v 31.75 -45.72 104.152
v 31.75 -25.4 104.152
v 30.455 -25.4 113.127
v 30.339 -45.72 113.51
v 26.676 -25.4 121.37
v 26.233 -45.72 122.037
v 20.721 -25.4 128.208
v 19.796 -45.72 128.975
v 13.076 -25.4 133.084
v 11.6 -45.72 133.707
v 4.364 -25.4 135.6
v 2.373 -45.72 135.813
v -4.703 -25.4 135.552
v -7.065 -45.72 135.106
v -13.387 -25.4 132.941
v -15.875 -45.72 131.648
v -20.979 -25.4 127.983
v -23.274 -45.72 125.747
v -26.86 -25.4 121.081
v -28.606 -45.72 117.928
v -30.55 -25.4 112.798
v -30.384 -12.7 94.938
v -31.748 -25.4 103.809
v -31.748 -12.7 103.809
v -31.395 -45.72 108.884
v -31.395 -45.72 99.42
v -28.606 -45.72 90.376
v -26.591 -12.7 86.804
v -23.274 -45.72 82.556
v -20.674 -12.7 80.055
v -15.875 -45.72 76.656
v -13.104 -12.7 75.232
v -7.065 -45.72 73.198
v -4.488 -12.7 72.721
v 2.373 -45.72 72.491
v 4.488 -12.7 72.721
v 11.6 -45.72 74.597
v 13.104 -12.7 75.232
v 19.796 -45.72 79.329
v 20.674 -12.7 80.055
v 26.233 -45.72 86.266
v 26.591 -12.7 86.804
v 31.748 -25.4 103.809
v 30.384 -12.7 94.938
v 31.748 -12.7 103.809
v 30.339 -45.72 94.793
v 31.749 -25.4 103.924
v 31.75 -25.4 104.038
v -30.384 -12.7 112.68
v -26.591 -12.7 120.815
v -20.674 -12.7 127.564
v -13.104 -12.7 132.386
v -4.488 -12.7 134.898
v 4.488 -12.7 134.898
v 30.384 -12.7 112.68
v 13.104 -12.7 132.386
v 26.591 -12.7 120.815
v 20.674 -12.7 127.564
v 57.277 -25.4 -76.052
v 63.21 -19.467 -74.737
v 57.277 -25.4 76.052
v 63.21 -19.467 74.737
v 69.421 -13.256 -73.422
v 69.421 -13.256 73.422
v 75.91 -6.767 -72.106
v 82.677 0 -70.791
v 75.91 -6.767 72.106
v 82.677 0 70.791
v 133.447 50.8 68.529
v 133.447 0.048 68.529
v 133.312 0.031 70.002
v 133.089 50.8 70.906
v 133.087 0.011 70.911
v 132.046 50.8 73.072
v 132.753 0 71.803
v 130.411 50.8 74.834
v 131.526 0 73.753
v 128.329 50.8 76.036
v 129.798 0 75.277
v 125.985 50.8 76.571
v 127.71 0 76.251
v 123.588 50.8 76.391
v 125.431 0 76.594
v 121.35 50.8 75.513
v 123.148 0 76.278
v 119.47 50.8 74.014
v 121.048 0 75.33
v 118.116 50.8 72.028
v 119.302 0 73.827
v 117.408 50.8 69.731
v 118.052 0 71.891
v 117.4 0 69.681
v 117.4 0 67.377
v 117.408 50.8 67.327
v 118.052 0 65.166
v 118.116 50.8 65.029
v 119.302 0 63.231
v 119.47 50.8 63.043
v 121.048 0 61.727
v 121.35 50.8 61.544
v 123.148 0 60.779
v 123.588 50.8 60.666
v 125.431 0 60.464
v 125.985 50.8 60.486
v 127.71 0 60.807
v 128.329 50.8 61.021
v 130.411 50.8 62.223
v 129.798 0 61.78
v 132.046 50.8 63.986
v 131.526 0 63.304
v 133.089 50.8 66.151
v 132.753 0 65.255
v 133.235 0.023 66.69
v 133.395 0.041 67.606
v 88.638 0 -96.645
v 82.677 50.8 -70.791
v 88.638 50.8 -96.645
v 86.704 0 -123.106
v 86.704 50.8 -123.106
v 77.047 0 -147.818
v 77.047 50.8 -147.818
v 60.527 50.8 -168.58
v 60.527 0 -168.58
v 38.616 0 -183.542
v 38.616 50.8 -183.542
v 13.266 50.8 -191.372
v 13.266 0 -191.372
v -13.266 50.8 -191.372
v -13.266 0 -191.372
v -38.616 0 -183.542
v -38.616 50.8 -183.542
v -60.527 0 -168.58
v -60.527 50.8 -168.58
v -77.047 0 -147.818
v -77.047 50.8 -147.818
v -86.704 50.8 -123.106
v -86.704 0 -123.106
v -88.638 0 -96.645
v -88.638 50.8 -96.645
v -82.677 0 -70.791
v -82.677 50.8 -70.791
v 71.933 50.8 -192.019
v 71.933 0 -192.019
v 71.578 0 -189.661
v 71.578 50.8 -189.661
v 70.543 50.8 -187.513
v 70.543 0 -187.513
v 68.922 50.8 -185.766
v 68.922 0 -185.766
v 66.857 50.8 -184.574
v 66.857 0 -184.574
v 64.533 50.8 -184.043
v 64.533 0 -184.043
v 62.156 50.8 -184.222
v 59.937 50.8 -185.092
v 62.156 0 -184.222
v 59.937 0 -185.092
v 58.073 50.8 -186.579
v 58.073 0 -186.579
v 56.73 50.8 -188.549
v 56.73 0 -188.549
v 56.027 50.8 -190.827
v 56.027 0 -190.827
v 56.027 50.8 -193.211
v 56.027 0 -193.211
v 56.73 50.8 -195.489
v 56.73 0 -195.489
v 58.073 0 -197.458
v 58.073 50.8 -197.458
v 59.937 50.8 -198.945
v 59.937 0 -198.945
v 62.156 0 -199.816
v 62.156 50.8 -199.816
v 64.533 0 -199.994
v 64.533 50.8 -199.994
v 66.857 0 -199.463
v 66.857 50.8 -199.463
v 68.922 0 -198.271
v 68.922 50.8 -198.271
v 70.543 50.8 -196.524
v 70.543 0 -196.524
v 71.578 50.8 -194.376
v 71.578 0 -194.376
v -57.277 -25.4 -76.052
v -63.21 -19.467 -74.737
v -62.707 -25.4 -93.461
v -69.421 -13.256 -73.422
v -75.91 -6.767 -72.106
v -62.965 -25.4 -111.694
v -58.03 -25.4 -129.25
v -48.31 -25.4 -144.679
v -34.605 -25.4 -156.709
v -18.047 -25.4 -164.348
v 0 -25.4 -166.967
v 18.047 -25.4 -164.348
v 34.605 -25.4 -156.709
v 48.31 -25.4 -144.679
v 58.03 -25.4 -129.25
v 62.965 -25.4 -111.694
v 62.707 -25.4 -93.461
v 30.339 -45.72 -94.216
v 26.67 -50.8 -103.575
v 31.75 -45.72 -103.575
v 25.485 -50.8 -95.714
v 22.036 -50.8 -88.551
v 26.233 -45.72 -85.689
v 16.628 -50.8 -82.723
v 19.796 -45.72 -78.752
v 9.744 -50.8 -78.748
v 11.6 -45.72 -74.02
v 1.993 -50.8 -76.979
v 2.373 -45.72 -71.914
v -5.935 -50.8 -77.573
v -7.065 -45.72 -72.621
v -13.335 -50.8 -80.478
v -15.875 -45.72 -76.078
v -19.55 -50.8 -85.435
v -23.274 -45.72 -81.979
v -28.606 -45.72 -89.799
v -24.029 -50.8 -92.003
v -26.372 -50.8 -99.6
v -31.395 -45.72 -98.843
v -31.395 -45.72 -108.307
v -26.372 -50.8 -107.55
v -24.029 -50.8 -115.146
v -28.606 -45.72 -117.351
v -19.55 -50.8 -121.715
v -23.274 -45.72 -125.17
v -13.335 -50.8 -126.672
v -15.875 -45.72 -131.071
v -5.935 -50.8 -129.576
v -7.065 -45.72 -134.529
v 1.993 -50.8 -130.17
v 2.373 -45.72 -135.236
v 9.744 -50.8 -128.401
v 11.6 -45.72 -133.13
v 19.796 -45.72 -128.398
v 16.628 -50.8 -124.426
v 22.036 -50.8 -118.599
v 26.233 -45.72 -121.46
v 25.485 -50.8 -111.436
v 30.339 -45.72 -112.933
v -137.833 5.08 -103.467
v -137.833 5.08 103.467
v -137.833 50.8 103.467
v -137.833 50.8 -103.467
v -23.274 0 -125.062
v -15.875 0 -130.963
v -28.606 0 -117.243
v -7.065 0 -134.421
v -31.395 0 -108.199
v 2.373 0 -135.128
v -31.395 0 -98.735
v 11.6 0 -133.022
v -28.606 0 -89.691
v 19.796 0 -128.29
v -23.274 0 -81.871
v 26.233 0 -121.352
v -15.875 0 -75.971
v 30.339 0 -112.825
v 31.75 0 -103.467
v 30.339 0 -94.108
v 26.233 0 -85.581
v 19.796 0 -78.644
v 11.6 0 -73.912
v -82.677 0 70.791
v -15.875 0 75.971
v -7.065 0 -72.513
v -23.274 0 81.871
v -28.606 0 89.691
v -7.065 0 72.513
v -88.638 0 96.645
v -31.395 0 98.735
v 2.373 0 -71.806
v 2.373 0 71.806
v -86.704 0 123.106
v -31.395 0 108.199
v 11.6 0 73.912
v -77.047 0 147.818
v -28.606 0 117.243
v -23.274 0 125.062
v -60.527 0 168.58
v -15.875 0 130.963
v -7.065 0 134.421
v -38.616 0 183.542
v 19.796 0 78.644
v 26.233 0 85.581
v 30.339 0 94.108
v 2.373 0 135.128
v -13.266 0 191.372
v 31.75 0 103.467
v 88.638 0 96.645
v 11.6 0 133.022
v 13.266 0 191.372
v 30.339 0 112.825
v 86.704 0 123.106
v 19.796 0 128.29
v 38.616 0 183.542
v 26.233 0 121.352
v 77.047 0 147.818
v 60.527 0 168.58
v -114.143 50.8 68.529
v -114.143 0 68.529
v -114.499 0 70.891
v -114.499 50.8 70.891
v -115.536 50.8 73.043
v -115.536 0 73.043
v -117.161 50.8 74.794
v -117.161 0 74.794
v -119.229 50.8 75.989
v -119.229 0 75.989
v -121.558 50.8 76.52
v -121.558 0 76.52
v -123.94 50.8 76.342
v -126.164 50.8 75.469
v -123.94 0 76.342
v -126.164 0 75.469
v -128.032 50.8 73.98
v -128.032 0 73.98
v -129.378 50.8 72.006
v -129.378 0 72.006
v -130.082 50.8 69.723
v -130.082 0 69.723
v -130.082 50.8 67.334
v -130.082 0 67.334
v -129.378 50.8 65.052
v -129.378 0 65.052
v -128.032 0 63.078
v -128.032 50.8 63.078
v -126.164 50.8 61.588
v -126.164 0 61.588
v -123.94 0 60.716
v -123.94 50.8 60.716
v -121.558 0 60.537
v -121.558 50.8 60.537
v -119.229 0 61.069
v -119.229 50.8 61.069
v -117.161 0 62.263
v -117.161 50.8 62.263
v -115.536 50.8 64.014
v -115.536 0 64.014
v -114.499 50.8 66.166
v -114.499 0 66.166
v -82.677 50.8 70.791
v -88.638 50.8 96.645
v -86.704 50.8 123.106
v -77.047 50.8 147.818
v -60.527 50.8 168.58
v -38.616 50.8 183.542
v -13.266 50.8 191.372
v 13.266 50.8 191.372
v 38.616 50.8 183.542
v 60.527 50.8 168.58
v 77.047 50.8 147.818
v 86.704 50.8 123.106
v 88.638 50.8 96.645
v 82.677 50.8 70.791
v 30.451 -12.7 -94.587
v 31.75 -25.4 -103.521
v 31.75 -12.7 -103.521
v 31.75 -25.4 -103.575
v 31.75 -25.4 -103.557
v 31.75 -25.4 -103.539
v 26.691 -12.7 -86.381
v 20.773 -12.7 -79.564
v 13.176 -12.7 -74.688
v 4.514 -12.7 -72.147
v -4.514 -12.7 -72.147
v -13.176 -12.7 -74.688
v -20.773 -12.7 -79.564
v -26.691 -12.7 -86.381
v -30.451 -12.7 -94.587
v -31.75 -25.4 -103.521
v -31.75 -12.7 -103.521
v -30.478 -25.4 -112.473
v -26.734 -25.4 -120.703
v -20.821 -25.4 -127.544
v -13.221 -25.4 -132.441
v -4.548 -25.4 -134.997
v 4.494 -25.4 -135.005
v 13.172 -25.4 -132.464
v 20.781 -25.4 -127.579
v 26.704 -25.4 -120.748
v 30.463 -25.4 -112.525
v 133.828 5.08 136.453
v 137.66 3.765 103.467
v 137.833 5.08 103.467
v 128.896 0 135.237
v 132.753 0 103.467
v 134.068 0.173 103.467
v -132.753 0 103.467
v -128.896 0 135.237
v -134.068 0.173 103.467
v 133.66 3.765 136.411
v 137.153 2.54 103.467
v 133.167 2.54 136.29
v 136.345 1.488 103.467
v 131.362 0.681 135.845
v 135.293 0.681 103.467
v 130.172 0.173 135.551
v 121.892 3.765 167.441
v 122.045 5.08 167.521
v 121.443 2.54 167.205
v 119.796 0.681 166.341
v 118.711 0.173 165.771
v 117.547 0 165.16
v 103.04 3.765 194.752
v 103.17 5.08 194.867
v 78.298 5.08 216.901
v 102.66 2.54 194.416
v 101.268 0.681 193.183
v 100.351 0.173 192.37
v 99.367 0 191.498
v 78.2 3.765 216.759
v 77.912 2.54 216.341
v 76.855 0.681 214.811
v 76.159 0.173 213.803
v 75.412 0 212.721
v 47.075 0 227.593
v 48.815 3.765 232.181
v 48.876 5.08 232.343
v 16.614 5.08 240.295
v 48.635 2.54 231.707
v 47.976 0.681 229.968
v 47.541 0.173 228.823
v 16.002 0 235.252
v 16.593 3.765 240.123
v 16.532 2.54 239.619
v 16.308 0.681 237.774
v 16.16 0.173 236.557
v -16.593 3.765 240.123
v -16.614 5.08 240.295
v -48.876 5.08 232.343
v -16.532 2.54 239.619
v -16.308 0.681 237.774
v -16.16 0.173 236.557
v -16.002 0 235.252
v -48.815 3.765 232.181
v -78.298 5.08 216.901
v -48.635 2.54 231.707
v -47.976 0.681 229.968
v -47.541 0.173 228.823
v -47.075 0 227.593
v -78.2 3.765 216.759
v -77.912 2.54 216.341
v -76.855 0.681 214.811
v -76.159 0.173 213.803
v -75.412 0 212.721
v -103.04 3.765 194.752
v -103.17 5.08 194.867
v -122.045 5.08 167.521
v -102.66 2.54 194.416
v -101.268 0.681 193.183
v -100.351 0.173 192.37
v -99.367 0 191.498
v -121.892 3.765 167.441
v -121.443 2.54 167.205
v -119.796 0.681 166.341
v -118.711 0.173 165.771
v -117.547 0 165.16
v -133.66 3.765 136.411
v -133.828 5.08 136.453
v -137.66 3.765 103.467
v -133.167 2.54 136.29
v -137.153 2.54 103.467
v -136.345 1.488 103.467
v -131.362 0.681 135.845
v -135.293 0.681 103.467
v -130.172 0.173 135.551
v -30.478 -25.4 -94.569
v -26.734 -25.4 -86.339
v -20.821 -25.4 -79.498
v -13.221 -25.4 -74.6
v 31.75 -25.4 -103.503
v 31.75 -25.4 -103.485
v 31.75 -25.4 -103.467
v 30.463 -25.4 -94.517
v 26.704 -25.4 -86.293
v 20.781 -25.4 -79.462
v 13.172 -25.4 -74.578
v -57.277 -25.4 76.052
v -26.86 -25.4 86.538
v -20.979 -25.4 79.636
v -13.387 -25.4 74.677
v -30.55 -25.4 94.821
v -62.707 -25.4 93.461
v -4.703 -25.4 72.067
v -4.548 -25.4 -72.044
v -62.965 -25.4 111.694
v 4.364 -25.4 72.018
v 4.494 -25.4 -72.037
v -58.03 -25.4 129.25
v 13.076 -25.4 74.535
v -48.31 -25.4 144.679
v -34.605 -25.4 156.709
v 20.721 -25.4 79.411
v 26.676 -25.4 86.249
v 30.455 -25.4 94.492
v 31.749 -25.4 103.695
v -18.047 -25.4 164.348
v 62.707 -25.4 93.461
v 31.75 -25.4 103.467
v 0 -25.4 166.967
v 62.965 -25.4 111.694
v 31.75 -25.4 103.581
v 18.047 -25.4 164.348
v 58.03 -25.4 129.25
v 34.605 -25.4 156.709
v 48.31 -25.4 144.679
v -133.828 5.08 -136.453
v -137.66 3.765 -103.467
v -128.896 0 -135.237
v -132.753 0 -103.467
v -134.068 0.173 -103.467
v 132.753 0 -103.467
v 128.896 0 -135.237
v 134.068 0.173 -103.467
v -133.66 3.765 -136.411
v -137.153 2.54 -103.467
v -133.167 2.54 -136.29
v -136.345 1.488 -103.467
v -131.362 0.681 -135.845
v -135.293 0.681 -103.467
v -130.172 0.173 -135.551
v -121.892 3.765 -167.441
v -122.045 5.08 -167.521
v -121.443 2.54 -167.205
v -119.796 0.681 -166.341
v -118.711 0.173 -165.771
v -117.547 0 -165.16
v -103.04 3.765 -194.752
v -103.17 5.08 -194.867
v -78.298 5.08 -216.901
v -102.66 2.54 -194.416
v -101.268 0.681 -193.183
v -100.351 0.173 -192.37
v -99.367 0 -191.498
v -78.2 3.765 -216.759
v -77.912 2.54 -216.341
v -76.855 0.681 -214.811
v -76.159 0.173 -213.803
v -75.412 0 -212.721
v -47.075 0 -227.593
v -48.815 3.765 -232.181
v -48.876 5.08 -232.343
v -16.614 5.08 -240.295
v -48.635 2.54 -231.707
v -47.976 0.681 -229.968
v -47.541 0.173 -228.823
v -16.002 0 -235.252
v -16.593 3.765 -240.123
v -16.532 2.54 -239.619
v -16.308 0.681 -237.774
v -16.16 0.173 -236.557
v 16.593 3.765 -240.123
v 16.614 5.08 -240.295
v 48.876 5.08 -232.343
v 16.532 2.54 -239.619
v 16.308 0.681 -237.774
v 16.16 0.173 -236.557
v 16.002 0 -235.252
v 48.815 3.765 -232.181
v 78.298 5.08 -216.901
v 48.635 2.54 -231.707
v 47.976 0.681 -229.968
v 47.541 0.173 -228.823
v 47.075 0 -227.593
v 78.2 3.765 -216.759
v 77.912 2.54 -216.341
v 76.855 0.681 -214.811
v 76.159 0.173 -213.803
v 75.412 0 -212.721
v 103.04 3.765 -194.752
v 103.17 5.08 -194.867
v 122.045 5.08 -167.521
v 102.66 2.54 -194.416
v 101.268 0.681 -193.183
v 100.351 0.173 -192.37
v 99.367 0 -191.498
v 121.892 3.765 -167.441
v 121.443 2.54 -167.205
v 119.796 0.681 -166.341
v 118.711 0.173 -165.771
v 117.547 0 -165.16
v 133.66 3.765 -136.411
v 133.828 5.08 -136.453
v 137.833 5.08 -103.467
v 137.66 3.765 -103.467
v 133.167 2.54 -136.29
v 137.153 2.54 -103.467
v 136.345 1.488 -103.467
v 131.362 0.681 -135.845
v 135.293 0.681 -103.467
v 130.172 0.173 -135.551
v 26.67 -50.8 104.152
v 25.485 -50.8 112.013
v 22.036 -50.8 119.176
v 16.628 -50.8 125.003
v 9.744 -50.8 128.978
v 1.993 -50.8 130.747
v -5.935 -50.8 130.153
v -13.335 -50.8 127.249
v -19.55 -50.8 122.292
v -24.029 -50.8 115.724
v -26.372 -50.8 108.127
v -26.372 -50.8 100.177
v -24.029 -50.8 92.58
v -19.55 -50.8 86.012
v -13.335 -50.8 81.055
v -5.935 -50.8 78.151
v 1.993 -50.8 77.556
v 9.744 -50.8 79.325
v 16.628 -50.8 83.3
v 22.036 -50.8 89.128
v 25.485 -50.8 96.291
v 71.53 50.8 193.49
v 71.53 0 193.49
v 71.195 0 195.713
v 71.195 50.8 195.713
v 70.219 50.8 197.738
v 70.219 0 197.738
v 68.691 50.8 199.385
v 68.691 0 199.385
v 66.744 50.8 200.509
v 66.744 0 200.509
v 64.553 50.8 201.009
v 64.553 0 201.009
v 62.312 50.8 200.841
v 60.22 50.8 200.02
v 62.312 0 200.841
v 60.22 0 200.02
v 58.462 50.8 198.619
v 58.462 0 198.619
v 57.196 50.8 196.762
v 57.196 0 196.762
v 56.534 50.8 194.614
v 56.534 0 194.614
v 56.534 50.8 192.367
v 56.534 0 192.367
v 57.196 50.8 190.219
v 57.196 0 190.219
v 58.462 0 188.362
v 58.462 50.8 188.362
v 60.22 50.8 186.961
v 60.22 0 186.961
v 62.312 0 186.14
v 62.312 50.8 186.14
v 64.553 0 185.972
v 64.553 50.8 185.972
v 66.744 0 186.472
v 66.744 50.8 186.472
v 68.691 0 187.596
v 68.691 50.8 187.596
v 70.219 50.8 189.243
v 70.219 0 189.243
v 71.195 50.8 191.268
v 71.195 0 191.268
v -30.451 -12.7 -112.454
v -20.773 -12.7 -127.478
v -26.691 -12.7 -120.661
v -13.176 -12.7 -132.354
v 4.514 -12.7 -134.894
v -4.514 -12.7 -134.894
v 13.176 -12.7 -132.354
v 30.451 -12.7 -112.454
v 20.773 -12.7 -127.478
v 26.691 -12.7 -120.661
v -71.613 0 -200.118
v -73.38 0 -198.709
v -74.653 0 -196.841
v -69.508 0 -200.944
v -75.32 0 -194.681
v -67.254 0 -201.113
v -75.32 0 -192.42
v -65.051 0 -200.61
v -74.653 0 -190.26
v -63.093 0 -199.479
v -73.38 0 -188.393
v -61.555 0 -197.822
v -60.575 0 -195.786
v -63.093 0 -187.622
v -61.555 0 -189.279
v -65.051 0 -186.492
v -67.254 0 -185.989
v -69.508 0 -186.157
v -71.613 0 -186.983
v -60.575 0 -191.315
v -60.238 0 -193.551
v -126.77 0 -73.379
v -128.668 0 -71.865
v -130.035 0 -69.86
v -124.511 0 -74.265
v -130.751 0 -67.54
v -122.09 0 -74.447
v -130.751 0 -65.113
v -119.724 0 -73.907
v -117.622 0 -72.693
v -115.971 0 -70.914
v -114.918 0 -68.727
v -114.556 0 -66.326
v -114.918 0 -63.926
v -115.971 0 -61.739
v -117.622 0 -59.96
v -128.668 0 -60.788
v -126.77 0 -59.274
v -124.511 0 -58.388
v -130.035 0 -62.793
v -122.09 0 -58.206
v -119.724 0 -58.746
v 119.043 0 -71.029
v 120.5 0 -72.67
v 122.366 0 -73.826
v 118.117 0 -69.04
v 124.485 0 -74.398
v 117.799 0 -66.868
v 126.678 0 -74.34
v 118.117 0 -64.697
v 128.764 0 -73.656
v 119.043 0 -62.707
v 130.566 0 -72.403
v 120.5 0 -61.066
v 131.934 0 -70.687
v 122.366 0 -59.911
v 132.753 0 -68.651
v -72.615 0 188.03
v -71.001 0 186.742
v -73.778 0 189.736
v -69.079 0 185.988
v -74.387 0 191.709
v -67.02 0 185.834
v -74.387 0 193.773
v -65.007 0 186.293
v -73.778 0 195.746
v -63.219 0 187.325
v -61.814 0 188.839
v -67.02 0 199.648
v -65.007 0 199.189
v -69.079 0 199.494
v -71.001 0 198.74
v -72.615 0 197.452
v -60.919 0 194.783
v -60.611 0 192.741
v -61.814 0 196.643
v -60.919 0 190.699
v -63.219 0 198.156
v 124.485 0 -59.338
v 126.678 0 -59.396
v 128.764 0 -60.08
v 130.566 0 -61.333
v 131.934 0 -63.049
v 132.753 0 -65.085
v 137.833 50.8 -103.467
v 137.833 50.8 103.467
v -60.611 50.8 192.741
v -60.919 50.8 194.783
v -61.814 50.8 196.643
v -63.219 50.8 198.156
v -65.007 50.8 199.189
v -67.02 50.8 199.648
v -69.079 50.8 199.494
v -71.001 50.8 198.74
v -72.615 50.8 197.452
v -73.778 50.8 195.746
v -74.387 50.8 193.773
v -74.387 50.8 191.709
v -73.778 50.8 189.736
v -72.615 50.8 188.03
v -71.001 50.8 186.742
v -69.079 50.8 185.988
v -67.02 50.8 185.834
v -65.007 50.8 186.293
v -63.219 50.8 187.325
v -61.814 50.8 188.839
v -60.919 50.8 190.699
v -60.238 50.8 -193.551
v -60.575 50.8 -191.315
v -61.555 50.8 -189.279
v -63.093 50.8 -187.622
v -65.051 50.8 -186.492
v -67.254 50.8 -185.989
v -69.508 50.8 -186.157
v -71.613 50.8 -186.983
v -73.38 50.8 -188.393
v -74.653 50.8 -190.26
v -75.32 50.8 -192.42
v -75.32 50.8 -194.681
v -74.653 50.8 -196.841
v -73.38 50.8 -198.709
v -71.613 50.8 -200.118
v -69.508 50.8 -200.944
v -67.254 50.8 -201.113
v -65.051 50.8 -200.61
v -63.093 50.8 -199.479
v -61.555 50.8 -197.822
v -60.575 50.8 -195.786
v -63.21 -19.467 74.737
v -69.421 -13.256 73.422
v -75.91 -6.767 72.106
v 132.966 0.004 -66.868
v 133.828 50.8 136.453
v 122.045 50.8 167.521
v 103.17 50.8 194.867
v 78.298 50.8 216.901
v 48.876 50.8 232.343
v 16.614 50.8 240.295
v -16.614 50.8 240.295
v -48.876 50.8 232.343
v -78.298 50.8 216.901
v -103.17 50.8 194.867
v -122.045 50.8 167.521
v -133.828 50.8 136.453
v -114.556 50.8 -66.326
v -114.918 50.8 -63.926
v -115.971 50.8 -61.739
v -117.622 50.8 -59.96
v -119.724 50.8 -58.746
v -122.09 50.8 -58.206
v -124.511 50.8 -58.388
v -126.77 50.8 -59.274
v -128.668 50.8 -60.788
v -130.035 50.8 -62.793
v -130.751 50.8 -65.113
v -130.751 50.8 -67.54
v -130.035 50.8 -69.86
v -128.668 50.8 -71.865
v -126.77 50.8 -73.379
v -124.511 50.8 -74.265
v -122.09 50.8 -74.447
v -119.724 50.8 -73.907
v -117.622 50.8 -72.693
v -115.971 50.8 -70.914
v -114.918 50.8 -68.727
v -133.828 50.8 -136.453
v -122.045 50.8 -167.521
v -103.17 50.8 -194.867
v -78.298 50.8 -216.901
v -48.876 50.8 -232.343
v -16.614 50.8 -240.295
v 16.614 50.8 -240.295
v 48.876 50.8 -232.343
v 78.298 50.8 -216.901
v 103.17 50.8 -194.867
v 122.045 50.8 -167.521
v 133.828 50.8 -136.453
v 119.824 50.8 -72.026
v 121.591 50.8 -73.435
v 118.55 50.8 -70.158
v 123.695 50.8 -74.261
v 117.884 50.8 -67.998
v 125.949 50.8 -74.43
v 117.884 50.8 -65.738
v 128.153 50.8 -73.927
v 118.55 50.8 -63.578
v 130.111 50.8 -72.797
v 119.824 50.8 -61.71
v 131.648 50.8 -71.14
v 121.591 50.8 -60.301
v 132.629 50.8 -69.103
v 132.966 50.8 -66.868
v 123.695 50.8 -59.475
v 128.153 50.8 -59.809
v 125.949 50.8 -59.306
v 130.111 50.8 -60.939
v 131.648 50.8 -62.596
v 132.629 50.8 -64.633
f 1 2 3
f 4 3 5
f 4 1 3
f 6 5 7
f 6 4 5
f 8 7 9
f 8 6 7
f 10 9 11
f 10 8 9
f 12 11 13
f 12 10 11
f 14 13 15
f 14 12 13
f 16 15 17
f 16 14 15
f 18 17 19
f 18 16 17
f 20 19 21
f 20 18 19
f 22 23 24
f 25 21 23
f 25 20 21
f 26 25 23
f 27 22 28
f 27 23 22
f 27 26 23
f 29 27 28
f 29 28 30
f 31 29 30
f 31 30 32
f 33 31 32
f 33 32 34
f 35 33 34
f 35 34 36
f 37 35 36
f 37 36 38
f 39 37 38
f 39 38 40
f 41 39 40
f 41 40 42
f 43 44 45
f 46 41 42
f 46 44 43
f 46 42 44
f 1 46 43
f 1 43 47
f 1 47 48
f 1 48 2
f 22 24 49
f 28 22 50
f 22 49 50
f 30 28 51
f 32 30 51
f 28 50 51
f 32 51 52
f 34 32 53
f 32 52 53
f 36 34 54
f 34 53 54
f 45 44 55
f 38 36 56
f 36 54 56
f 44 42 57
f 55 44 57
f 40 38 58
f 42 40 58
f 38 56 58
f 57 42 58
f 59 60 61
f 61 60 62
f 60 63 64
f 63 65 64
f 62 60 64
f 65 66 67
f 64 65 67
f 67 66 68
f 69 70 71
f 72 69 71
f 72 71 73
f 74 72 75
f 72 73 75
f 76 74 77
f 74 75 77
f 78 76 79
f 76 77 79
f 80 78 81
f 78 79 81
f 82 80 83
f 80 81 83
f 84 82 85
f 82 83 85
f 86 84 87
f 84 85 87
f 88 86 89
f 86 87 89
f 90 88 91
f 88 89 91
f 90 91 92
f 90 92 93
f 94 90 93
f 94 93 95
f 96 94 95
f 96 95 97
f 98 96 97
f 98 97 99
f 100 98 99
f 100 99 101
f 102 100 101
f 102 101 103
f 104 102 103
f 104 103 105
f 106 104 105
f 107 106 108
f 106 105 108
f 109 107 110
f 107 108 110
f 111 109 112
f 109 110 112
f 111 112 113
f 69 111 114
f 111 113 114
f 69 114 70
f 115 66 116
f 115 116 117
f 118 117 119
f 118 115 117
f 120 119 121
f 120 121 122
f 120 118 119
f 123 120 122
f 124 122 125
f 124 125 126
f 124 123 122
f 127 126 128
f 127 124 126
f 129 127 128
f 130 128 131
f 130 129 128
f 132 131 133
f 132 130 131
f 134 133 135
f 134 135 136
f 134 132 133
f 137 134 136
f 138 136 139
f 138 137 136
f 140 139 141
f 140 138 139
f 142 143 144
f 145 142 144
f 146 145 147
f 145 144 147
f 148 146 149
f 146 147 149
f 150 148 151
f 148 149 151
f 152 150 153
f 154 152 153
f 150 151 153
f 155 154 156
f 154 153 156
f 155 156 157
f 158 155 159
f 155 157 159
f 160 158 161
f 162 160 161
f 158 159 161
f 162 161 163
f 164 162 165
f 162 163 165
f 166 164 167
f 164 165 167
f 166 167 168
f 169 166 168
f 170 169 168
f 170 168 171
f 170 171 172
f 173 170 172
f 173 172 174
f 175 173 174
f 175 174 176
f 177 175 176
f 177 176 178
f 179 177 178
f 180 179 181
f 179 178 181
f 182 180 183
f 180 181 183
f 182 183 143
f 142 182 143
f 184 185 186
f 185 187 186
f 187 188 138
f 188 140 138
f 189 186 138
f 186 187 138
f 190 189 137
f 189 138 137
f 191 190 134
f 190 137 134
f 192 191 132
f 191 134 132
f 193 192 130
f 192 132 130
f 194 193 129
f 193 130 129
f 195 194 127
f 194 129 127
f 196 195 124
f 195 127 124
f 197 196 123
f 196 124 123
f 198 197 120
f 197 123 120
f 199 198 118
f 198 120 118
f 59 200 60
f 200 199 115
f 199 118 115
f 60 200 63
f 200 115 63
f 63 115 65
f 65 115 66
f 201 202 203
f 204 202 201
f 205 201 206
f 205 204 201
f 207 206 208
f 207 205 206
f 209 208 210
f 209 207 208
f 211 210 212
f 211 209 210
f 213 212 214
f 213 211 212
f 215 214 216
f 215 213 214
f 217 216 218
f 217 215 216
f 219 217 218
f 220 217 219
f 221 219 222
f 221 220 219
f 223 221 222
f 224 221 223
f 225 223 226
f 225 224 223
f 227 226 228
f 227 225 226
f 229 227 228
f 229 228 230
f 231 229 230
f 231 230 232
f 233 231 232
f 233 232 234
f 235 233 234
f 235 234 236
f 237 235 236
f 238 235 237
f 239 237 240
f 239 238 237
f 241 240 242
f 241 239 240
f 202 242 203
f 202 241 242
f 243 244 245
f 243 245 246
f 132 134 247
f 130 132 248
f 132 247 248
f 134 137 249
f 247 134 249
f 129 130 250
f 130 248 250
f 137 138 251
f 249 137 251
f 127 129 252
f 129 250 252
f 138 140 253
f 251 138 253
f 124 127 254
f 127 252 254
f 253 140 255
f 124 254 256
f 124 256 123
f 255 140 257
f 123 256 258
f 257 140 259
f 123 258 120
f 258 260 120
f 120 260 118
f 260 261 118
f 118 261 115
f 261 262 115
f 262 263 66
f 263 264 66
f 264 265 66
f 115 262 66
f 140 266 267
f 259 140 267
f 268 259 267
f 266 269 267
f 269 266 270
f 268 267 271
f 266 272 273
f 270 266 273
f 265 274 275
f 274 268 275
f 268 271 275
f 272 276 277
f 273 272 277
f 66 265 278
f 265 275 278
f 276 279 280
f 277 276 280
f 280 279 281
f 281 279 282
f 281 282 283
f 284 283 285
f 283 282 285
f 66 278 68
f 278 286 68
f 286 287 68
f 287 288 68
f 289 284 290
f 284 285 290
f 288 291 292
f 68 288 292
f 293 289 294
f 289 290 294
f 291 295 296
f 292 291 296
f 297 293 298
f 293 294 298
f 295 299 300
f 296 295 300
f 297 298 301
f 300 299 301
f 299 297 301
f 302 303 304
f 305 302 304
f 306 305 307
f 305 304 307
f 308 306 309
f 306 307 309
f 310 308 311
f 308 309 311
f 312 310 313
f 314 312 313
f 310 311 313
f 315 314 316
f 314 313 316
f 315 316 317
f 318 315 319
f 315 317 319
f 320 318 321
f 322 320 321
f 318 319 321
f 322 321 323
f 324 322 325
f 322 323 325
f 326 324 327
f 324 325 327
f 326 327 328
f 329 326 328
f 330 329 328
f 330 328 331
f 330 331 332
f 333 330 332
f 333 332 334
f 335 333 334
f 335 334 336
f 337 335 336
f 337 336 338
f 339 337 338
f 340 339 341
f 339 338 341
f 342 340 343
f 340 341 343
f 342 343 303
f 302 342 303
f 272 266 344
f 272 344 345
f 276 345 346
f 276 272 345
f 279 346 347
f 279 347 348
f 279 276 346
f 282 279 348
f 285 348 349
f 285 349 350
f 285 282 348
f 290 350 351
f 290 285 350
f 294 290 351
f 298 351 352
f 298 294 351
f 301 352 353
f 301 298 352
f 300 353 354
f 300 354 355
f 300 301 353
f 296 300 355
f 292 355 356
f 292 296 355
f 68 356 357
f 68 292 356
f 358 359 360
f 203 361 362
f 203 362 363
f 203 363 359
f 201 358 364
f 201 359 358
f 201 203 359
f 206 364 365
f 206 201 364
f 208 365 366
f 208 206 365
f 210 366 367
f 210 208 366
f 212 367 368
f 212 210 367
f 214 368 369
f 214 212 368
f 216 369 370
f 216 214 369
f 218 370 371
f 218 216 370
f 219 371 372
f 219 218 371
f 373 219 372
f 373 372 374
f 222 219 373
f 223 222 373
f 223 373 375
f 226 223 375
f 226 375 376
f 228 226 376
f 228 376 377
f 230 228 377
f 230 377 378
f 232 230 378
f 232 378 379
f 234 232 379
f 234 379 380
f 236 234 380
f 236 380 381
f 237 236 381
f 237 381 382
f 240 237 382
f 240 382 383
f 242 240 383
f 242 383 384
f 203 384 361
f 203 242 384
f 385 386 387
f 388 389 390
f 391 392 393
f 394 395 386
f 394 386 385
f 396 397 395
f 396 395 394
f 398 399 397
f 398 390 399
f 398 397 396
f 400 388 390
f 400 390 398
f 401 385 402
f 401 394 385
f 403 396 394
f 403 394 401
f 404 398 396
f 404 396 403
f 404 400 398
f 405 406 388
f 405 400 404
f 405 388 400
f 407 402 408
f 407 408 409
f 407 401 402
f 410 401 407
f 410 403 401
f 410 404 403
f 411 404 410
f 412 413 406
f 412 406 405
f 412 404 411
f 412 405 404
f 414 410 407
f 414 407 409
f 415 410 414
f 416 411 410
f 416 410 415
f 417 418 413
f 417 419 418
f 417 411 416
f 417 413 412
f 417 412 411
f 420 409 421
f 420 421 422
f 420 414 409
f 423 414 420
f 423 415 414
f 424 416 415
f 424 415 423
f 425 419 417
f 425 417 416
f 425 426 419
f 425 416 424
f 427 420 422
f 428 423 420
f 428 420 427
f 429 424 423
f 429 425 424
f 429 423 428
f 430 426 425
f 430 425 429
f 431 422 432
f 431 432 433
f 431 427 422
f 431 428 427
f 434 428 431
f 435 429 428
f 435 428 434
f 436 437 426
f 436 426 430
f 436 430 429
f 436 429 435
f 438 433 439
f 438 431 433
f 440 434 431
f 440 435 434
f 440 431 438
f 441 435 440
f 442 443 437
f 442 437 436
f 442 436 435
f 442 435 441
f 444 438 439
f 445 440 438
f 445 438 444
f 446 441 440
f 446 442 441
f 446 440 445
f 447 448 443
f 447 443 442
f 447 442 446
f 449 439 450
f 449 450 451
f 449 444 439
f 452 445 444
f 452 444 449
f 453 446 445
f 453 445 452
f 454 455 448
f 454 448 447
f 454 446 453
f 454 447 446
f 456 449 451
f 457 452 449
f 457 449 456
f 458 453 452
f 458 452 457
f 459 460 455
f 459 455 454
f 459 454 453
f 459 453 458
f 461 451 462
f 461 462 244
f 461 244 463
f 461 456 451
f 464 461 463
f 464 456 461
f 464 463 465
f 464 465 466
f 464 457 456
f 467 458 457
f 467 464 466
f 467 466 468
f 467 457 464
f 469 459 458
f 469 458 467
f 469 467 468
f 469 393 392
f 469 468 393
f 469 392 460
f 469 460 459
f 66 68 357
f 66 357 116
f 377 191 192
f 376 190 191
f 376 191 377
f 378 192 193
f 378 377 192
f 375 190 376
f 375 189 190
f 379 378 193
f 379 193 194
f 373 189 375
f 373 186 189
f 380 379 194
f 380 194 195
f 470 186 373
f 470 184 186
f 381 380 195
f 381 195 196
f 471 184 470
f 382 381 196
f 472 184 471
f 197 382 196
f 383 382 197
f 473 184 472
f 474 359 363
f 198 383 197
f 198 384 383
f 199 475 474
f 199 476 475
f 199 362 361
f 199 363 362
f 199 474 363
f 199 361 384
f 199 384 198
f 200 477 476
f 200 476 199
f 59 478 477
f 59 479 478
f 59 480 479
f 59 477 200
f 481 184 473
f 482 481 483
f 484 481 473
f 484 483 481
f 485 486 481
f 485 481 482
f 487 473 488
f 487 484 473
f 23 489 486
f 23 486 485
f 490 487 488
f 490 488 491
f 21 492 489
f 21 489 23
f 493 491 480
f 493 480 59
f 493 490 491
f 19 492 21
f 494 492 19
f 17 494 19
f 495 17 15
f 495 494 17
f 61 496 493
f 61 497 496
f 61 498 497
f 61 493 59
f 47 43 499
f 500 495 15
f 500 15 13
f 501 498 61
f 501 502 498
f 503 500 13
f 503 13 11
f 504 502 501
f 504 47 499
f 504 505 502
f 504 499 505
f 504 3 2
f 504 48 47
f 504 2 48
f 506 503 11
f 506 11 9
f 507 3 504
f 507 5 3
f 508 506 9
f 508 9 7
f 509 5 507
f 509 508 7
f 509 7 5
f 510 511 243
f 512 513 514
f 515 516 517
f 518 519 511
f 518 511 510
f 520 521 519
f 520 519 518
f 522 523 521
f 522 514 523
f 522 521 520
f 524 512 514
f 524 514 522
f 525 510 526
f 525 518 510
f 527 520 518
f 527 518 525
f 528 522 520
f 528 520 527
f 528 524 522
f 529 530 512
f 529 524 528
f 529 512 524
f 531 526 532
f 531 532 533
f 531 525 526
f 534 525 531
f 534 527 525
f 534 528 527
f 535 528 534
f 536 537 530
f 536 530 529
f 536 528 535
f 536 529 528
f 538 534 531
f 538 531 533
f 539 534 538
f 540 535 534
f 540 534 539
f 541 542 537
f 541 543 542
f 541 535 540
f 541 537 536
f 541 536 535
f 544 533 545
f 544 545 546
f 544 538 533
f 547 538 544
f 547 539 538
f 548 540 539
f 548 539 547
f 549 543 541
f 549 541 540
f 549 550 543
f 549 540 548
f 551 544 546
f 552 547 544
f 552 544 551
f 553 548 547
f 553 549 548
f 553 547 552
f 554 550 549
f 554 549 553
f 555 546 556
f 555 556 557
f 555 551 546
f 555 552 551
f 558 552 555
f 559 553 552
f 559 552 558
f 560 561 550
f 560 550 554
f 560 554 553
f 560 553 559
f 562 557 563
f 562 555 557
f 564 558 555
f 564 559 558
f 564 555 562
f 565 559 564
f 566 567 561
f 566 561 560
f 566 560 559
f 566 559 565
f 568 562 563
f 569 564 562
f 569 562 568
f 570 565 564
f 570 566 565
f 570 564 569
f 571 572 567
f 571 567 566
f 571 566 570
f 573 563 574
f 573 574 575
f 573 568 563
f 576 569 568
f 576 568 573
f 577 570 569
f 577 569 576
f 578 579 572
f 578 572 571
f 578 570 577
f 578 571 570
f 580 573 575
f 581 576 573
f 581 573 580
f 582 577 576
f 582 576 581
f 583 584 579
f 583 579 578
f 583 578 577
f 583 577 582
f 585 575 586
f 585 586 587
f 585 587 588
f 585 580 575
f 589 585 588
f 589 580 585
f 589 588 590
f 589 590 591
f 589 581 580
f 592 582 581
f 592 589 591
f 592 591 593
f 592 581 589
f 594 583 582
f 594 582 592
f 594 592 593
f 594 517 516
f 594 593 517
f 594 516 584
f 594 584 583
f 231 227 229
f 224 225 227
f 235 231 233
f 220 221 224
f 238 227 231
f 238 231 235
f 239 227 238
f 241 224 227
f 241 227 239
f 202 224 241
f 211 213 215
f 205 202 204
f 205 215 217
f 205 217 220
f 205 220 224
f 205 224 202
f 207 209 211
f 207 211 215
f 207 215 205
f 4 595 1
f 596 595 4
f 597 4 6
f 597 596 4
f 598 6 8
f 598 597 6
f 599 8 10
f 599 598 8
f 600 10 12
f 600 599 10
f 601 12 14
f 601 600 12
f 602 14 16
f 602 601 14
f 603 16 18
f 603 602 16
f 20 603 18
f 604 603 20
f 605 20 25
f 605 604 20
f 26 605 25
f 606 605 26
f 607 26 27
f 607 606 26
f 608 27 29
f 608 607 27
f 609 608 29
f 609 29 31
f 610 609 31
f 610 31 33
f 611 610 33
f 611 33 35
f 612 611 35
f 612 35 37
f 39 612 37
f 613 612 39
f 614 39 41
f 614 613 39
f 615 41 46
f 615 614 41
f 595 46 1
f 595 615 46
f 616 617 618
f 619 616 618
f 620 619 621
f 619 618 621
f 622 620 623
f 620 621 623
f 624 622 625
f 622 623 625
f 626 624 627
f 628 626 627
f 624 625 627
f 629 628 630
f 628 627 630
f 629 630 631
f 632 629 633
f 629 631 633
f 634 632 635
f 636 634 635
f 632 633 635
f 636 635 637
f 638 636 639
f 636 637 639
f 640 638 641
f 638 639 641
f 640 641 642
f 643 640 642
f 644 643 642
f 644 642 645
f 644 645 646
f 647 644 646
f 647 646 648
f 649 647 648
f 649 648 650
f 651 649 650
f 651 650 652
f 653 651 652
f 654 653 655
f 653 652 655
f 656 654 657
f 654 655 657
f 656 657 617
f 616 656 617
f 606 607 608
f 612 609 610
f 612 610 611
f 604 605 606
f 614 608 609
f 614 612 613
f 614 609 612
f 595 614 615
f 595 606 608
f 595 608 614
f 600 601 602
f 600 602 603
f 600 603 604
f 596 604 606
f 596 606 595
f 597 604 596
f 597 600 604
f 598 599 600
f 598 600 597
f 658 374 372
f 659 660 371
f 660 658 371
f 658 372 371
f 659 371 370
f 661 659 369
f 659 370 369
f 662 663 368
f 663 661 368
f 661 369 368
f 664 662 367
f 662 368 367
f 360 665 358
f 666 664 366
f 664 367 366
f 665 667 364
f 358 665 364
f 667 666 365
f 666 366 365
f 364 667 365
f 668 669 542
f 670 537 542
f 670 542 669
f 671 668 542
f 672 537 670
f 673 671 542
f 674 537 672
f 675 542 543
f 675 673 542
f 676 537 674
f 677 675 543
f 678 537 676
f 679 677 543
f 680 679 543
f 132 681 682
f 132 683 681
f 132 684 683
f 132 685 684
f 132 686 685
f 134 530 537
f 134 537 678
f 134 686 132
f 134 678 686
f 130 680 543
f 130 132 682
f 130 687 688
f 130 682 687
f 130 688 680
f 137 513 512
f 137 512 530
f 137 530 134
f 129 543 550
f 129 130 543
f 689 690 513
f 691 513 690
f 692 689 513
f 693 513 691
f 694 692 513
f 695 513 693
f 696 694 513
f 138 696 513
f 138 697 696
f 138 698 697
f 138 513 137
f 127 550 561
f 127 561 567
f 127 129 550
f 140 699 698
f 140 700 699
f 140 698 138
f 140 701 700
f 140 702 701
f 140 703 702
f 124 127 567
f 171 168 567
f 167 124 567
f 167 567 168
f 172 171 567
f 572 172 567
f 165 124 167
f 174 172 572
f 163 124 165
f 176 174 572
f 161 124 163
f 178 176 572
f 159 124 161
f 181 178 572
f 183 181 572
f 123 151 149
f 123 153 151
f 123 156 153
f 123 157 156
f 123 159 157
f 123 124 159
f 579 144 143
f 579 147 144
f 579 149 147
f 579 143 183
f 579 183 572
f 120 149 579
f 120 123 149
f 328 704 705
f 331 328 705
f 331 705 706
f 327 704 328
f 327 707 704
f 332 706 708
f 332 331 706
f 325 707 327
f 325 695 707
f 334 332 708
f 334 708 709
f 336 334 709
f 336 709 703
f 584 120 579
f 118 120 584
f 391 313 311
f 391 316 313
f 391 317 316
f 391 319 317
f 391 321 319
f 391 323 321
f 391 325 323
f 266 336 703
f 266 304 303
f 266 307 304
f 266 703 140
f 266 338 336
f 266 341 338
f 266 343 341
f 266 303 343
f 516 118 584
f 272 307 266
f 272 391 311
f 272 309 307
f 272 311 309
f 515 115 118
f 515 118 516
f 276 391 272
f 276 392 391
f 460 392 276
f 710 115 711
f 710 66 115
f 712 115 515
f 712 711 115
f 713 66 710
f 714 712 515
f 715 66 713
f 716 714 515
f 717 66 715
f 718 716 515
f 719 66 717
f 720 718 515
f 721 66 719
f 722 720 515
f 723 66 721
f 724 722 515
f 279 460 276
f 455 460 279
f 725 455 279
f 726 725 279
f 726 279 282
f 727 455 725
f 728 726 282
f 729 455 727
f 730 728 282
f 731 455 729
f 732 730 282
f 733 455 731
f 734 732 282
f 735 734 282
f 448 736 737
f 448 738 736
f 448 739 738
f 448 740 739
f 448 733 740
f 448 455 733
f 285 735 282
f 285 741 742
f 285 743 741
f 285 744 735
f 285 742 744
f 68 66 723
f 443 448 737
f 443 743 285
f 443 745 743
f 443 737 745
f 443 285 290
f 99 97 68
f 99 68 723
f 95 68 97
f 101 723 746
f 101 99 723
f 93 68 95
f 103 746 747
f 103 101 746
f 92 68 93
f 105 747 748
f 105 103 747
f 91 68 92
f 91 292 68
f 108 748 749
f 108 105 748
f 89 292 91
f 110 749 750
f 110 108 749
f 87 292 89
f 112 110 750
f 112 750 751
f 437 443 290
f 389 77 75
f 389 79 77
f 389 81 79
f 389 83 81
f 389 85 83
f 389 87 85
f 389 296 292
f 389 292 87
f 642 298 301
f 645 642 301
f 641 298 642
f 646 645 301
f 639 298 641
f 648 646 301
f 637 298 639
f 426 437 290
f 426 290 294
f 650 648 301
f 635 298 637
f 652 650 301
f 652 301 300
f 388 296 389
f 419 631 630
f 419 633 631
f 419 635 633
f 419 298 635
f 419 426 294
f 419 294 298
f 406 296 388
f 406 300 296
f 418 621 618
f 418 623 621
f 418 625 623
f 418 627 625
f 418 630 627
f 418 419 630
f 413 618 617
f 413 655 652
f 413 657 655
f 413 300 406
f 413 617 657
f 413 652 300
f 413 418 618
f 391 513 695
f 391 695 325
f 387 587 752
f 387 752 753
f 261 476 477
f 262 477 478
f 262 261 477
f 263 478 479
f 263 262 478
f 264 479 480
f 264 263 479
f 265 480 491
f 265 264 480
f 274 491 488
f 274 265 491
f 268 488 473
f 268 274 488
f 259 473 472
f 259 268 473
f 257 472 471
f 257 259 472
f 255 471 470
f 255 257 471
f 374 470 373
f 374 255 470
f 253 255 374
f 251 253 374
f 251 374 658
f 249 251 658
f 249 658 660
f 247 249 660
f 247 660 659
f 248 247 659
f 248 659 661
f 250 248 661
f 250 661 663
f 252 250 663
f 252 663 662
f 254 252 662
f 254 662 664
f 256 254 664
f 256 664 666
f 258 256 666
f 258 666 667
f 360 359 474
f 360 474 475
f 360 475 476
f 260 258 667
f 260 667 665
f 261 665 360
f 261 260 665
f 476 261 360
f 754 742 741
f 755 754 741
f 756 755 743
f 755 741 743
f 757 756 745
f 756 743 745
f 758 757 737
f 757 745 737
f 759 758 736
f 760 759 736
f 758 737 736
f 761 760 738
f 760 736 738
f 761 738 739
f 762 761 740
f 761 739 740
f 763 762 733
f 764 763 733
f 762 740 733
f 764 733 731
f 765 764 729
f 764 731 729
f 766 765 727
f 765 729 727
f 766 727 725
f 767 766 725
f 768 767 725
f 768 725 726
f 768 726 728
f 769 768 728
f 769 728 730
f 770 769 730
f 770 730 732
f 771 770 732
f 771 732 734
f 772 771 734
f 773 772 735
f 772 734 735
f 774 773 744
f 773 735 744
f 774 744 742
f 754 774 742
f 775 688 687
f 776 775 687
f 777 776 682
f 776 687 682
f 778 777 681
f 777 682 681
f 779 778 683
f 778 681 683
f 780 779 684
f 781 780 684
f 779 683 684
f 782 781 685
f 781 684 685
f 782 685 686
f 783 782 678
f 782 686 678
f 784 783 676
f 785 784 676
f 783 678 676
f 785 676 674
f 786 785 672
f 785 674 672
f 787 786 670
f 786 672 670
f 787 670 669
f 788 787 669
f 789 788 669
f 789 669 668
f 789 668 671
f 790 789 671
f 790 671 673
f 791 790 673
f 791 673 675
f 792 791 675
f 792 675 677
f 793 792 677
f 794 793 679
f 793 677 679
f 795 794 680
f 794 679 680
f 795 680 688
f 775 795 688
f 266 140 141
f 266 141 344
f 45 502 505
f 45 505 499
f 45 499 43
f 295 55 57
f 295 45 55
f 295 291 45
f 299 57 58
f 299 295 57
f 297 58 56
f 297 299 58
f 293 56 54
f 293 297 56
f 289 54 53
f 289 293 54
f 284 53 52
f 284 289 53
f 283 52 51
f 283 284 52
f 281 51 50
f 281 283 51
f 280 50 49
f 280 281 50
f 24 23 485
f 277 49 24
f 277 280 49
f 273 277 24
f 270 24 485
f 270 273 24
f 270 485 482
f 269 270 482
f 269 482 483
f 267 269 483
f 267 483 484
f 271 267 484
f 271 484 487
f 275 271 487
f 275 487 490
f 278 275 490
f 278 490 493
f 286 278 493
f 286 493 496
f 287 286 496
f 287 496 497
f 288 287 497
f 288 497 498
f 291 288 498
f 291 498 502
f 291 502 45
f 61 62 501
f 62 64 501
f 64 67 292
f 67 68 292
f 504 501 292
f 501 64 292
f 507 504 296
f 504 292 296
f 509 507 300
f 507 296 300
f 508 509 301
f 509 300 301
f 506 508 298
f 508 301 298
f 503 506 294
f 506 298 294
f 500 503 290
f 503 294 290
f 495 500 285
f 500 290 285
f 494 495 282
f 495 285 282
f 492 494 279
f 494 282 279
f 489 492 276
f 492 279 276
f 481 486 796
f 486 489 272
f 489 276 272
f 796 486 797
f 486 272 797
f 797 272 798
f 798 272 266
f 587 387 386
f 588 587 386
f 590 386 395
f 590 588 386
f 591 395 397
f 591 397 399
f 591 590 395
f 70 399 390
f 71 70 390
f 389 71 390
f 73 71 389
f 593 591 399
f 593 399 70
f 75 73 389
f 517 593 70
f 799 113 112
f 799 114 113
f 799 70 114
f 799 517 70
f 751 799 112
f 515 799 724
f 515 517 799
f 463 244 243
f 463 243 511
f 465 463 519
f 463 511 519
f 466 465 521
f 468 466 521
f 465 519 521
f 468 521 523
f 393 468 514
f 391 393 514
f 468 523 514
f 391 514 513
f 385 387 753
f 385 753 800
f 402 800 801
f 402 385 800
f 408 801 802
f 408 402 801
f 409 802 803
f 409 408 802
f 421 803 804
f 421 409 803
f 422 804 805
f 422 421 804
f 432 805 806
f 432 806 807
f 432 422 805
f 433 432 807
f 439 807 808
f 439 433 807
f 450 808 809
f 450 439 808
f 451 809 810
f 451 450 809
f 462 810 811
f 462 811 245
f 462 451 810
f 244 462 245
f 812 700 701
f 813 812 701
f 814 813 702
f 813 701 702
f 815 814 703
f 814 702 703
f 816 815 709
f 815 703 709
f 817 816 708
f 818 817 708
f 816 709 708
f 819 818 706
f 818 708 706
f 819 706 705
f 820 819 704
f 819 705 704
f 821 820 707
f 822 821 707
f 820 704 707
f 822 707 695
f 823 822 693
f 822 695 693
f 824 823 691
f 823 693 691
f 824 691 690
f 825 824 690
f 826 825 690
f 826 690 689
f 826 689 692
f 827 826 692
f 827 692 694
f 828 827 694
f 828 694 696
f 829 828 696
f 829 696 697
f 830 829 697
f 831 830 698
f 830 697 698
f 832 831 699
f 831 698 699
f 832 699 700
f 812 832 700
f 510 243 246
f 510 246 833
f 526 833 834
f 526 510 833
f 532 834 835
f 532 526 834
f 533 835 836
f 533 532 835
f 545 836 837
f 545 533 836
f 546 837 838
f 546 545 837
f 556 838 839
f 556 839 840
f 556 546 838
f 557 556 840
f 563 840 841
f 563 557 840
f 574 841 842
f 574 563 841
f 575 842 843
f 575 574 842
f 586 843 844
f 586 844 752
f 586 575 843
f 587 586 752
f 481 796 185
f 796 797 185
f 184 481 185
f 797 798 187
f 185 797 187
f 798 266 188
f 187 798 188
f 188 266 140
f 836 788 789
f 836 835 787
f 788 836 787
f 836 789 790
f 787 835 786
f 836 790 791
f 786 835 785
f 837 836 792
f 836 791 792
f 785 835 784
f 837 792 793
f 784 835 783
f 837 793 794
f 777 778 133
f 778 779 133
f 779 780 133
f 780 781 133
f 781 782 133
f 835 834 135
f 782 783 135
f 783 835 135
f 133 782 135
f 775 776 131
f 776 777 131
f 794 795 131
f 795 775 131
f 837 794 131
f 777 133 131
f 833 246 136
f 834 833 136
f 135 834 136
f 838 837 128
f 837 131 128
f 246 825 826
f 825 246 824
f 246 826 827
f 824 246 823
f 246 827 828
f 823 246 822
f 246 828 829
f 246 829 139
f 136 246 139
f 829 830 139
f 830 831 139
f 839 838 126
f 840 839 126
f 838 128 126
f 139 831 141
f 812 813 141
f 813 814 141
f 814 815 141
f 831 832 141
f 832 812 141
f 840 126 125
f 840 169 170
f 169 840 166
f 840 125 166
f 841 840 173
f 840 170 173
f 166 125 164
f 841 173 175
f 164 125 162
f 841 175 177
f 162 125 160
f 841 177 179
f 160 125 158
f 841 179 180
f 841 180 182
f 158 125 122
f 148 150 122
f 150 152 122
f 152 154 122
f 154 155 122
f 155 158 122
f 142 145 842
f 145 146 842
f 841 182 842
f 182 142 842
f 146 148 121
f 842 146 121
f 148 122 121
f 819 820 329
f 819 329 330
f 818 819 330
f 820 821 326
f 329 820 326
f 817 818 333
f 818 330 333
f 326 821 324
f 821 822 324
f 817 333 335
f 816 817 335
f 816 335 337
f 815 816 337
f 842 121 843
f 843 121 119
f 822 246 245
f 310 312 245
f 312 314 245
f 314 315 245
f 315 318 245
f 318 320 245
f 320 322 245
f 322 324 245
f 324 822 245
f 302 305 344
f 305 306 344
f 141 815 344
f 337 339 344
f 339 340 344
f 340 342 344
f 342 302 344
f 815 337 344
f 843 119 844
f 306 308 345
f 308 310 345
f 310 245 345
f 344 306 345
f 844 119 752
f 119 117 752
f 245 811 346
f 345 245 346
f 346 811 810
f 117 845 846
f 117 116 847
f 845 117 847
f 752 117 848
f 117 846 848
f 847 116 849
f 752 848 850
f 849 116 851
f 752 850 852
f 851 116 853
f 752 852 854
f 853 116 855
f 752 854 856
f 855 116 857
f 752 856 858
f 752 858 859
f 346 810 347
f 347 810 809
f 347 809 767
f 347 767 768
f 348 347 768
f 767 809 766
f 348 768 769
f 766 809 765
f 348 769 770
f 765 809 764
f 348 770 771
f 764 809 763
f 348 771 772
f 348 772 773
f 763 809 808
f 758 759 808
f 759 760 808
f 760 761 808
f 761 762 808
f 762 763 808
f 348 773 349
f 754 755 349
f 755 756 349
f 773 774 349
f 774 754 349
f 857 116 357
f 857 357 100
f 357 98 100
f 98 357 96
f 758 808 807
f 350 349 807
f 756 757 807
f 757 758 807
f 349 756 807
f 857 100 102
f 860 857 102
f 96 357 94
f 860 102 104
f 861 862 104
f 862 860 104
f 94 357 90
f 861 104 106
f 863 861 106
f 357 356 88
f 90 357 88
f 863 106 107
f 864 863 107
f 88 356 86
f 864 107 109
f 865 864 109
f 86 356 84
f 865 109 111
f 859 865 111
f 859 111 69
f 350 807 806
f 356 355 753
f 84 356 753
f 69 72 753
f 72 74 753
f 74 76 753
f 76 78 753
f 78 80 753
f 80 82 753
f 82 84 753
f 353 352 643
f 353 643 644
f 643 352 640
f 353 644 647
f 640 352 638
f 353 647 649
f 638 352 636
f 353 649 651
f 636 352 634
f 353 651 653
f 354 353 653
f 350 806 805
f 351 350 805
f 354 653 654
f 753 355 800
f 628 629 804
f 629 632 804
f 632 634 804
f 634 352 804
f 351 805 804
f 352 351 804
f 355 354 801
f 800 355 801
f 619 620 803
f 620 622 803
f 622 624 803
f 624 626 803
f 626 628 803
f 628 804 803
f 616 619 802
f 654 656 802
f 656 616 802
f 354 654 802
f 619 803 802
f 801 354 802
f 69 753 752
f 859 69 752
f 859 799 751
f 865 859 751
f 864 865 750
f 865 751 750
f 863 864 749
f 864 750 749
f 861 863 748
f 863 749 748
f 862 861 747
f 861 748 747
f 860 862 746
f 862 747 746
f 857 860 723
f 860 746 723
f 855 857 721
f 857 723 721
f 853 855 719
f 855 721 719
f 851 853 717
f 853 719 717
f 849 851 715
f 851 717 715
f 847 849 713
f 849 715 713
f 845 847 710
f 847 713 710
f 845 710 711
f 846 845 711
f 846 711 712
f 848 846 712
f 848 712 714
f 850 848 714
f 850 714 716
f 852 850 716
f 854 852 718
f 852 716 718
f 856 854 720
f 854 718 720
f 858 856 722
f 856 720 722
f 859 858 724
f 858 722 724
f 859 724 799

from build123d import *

# Parameters (mm, degrees)
F0_R        = 7.5832559133
F0_R_2      = 8.1429677051
F0_R_3      = 7.9975424125
F0_R_4      = 7.5832754374
F0_R_5      = 8.0140482533
F0_R_6      = 6.9266770474
F0_R_7      = 8.0650025084
F0_R_8      = 7.5399035307
F1_DEPTH    = 50.8
F0_R_9      = 38.1
F0_R_10     = 31.75
F2_DEPTH    = 25.4
F4_R        = 31.75
F5_DEPTH    = 38.1
F6_SIZE     = 5.08
F7_T1_DEPTH = 206.9338
F7_T4_ANGLE = 180
F7_T6_ANGLE = 180
F8_SIZE     = 25.39999


# Not quite as in the source:
# - a fillet or chamfer that OpenCascade refuses, or shapes differently, is made with other operations: its cross-section is extruded or revolved along the edge and cut away or added
# - a fillet or chamfer is up to 0.001 mm smaller than in the source, because OpenCascade refuses the exact size


with BuildPart() as f1:
    # F0 (on Front) → F1 (new body)
    with BuildSketch(Plane.XZ):
        with BuildLine():
            Line((137.8331, -103.4669), (137.8331, 103.4669))
            ThreePointArc((137.8331, 103.4669), (0, 241.3), (-137.8331, 103.4669))
            Line((-137.8331, 103.4669), (-137.8331, -103.4669))
            ThreePointArc((-137.8331, -103.4669), (0, -241.3), (137.8331, -103.4669))
        make_face()
        with Locations((-67.8210385144, -193.5505885762)):
            Circle(F0_R, mode=Mode.SUBTRACT)
        with Locations((-122.6988486946, -66.3264859599)):
            Circle(F0_R_2, mode=Mode.SUBTRACT)
        with Locations((63.9354459941, -192.0185405892)):
            Circle(F0_R_3, mode=Mode.SUBTRACT)
        with Locations((125.382462889, -66.8681580704)):
            Circle(F0_R_4, mode=Mode.SUBTRACT)
        with Locations((-122.1571840346, 68.5286801177)):
            Circle(F0_R_5, mode=Mode.SUBTRACT)
        with Locations((-67.5374619663, 192.7409227806)):
            Circle(F0_R_6, mode=Mode.SUBTRACT)
        with BuildLine():
            ThreePointArc((-82.6771222469, 70.7911680728), (0, 192.3669), (82.6771222469, 70.7911680728))
            Line((82.6771222469, 70.7911680728), (82.6771222469, -70.7911680728))
            ThreePointArc((82.6771222469, -70.7911680728), (0, -192.3669), (-82.6771222469, -70.7911680728))
            Line((-82.6771222469, -70.7911680728), (-82.6771222469, 70.7911680728))
        make_face(mode=Mode.SUBTRACT)
        with Locations((125.382462889, 68.5286801177)):
            Circle(F0_R_7, mode=Mode.SUBTRACT)
        with Locations((63.9896340668, 193.4904660898)):
            Circle(F0_R_8, mode=Mode.SUBTRACT)
    extrude(amount=-F1_DEPTH)

    # F7: fillet of radius 5.08 on 4 edges, made by hand

    # F7_s2 → F7_t1 (cut)
    with BuildSketch(Plane.XY.offset(-103.4669)):
        with BuildLine():
            ThreePointArc((137.8331, 5.08), (136.3452024484, 1.4878975516), (132.7531, 0))
            Line((132.7531, 0), (137.8331, 0))
            Line((137.8331, 0), (137.8331, 5.08))
        make_face()
        with BuildLine():
            ThreePointArc((-137.8331, 5.08), (-136.3452024484, 1.4878975516), (-132.7531, 0))
            Line((-132.7531, 0), (-137.8331, 0))
            Line((-137.8331, 0), (-137.8331, 5.08))
        make_face()
    extrude(amount=F7_T1_DEPTH, mode=Mode.SUBTRACT)

    # F7_s3 → F7_t4 (revolve, cut)
    with BuildSketch(Plane.XY.offset(103.4669)):
        with BuildLine():
            ThreePointArc((137.8331, 5.08), (136.3452024484, 1.4878975516), (132.7531, 0))
            Line((132.7531, 0), (137.8331, 0))
            Line((137.8331, 0), (137.8331, 5.08))
        make_face()
    revolve(axis=Axis((0, 0, 103.4669), (0, -1, 0)), revolution_arc=F7_T4_ANGLE, mode=Mode.SUBTRACT)

    # F7_s5 → F7_t6 (revolve, cut)
    with BuildSketch(Plane.XY.offset(-103.4669)):
        with BuildLine():
            ThreePointArc((-137.8331, 5.08), (-136.3452024484, 1.4878975516), (-132.7531, 0))
            Line((-132.7531, 0), (-137.8331, 0))
            Line((-137.8331, 0), (-137.8331, 5.08))
        make_face()
    revolve(axis=Axis((0, 0, -103.4669), (0, -1, 0)), revolution_arc=F7_T6_ANGLE, mode=Mode.SUBTRACT)


with BuildPart() as f2:
    # F0 (on Front) → F2 (new body)
    with BuildSketch(Plane.XZ):
        with BuildLine():
            Line((82.6771222469, -70.7911680728), (82.6771222469, 70.7911680728))
            ThreePointArc((82.6771222469, 70.7911680728), (0, 192.3669), (-82.6771222469, 70.7911680728))
            Line((-82.6771222469, 70.7911680728), (-82.6771222469, -70.7911680728))
            ThreePointArc((-82.6771222469, -70.7911680728), (0, -192.3669), (82.6771222469, -70.7911680728))
        make_face()
        with Locations((0, -103.4669)):
            Circle(F0_R_9, mode=Mode.SUBTRACT)
        with Locations((0, 103.4669)):
            Circle(F0_R_9, mode=Mode.SUBTRACT)
        with Locations((0, 103.4669)):
            Circle(F0_R_9)
        with Locations((0, 103.4669)):
            Circle(F0_R_10, mode=Mode.SUBTRACT)
        with Locations((0, -103.4669)):
            Circle(F0_R_9)
        with Locations((0, -103.4669)):
            Circle(F0_R_10, mode=Mode.SUBTRACT)
    extrude(amount=F2_DEPTH)

    # F4 (on offset) → F5 (join)
    with BuildSketch(Plane.XZ.offset(50.8)):
        with Locations((0, 104.1518346508)):
            Circle(F4_R)
        with Locations((0, -103.5747896099)):
            Circle(F4_R)
    extrude(amount=-F5_DEPTH)

    # F6
    f6_edges = [f2.edges().sort_by_distance(p)[0] for p in [
        (-31.75, -50.8, 104.151835),
        (-31.75, -50.8, -103.57479),
    ]]
    chamfer(f6_edges, length=F6_SIZE)

    # F8 (size 25.4 in the source; OpenCascade refuses exactly that, so slightly less here)
    f8_edges = [f2.edges().sort_by_distance(p)[0] for p in [
        (0, -25.4, 192.3669),
        (82.677122, -25.4, 0),
        (-82.677122, -25.4, 0),
        (0, -25.4, -192.3669),
    ]]
    chamfer(f8_edges, length=F8_SIZE)


solid = Compound([f1.part, f2.part])
